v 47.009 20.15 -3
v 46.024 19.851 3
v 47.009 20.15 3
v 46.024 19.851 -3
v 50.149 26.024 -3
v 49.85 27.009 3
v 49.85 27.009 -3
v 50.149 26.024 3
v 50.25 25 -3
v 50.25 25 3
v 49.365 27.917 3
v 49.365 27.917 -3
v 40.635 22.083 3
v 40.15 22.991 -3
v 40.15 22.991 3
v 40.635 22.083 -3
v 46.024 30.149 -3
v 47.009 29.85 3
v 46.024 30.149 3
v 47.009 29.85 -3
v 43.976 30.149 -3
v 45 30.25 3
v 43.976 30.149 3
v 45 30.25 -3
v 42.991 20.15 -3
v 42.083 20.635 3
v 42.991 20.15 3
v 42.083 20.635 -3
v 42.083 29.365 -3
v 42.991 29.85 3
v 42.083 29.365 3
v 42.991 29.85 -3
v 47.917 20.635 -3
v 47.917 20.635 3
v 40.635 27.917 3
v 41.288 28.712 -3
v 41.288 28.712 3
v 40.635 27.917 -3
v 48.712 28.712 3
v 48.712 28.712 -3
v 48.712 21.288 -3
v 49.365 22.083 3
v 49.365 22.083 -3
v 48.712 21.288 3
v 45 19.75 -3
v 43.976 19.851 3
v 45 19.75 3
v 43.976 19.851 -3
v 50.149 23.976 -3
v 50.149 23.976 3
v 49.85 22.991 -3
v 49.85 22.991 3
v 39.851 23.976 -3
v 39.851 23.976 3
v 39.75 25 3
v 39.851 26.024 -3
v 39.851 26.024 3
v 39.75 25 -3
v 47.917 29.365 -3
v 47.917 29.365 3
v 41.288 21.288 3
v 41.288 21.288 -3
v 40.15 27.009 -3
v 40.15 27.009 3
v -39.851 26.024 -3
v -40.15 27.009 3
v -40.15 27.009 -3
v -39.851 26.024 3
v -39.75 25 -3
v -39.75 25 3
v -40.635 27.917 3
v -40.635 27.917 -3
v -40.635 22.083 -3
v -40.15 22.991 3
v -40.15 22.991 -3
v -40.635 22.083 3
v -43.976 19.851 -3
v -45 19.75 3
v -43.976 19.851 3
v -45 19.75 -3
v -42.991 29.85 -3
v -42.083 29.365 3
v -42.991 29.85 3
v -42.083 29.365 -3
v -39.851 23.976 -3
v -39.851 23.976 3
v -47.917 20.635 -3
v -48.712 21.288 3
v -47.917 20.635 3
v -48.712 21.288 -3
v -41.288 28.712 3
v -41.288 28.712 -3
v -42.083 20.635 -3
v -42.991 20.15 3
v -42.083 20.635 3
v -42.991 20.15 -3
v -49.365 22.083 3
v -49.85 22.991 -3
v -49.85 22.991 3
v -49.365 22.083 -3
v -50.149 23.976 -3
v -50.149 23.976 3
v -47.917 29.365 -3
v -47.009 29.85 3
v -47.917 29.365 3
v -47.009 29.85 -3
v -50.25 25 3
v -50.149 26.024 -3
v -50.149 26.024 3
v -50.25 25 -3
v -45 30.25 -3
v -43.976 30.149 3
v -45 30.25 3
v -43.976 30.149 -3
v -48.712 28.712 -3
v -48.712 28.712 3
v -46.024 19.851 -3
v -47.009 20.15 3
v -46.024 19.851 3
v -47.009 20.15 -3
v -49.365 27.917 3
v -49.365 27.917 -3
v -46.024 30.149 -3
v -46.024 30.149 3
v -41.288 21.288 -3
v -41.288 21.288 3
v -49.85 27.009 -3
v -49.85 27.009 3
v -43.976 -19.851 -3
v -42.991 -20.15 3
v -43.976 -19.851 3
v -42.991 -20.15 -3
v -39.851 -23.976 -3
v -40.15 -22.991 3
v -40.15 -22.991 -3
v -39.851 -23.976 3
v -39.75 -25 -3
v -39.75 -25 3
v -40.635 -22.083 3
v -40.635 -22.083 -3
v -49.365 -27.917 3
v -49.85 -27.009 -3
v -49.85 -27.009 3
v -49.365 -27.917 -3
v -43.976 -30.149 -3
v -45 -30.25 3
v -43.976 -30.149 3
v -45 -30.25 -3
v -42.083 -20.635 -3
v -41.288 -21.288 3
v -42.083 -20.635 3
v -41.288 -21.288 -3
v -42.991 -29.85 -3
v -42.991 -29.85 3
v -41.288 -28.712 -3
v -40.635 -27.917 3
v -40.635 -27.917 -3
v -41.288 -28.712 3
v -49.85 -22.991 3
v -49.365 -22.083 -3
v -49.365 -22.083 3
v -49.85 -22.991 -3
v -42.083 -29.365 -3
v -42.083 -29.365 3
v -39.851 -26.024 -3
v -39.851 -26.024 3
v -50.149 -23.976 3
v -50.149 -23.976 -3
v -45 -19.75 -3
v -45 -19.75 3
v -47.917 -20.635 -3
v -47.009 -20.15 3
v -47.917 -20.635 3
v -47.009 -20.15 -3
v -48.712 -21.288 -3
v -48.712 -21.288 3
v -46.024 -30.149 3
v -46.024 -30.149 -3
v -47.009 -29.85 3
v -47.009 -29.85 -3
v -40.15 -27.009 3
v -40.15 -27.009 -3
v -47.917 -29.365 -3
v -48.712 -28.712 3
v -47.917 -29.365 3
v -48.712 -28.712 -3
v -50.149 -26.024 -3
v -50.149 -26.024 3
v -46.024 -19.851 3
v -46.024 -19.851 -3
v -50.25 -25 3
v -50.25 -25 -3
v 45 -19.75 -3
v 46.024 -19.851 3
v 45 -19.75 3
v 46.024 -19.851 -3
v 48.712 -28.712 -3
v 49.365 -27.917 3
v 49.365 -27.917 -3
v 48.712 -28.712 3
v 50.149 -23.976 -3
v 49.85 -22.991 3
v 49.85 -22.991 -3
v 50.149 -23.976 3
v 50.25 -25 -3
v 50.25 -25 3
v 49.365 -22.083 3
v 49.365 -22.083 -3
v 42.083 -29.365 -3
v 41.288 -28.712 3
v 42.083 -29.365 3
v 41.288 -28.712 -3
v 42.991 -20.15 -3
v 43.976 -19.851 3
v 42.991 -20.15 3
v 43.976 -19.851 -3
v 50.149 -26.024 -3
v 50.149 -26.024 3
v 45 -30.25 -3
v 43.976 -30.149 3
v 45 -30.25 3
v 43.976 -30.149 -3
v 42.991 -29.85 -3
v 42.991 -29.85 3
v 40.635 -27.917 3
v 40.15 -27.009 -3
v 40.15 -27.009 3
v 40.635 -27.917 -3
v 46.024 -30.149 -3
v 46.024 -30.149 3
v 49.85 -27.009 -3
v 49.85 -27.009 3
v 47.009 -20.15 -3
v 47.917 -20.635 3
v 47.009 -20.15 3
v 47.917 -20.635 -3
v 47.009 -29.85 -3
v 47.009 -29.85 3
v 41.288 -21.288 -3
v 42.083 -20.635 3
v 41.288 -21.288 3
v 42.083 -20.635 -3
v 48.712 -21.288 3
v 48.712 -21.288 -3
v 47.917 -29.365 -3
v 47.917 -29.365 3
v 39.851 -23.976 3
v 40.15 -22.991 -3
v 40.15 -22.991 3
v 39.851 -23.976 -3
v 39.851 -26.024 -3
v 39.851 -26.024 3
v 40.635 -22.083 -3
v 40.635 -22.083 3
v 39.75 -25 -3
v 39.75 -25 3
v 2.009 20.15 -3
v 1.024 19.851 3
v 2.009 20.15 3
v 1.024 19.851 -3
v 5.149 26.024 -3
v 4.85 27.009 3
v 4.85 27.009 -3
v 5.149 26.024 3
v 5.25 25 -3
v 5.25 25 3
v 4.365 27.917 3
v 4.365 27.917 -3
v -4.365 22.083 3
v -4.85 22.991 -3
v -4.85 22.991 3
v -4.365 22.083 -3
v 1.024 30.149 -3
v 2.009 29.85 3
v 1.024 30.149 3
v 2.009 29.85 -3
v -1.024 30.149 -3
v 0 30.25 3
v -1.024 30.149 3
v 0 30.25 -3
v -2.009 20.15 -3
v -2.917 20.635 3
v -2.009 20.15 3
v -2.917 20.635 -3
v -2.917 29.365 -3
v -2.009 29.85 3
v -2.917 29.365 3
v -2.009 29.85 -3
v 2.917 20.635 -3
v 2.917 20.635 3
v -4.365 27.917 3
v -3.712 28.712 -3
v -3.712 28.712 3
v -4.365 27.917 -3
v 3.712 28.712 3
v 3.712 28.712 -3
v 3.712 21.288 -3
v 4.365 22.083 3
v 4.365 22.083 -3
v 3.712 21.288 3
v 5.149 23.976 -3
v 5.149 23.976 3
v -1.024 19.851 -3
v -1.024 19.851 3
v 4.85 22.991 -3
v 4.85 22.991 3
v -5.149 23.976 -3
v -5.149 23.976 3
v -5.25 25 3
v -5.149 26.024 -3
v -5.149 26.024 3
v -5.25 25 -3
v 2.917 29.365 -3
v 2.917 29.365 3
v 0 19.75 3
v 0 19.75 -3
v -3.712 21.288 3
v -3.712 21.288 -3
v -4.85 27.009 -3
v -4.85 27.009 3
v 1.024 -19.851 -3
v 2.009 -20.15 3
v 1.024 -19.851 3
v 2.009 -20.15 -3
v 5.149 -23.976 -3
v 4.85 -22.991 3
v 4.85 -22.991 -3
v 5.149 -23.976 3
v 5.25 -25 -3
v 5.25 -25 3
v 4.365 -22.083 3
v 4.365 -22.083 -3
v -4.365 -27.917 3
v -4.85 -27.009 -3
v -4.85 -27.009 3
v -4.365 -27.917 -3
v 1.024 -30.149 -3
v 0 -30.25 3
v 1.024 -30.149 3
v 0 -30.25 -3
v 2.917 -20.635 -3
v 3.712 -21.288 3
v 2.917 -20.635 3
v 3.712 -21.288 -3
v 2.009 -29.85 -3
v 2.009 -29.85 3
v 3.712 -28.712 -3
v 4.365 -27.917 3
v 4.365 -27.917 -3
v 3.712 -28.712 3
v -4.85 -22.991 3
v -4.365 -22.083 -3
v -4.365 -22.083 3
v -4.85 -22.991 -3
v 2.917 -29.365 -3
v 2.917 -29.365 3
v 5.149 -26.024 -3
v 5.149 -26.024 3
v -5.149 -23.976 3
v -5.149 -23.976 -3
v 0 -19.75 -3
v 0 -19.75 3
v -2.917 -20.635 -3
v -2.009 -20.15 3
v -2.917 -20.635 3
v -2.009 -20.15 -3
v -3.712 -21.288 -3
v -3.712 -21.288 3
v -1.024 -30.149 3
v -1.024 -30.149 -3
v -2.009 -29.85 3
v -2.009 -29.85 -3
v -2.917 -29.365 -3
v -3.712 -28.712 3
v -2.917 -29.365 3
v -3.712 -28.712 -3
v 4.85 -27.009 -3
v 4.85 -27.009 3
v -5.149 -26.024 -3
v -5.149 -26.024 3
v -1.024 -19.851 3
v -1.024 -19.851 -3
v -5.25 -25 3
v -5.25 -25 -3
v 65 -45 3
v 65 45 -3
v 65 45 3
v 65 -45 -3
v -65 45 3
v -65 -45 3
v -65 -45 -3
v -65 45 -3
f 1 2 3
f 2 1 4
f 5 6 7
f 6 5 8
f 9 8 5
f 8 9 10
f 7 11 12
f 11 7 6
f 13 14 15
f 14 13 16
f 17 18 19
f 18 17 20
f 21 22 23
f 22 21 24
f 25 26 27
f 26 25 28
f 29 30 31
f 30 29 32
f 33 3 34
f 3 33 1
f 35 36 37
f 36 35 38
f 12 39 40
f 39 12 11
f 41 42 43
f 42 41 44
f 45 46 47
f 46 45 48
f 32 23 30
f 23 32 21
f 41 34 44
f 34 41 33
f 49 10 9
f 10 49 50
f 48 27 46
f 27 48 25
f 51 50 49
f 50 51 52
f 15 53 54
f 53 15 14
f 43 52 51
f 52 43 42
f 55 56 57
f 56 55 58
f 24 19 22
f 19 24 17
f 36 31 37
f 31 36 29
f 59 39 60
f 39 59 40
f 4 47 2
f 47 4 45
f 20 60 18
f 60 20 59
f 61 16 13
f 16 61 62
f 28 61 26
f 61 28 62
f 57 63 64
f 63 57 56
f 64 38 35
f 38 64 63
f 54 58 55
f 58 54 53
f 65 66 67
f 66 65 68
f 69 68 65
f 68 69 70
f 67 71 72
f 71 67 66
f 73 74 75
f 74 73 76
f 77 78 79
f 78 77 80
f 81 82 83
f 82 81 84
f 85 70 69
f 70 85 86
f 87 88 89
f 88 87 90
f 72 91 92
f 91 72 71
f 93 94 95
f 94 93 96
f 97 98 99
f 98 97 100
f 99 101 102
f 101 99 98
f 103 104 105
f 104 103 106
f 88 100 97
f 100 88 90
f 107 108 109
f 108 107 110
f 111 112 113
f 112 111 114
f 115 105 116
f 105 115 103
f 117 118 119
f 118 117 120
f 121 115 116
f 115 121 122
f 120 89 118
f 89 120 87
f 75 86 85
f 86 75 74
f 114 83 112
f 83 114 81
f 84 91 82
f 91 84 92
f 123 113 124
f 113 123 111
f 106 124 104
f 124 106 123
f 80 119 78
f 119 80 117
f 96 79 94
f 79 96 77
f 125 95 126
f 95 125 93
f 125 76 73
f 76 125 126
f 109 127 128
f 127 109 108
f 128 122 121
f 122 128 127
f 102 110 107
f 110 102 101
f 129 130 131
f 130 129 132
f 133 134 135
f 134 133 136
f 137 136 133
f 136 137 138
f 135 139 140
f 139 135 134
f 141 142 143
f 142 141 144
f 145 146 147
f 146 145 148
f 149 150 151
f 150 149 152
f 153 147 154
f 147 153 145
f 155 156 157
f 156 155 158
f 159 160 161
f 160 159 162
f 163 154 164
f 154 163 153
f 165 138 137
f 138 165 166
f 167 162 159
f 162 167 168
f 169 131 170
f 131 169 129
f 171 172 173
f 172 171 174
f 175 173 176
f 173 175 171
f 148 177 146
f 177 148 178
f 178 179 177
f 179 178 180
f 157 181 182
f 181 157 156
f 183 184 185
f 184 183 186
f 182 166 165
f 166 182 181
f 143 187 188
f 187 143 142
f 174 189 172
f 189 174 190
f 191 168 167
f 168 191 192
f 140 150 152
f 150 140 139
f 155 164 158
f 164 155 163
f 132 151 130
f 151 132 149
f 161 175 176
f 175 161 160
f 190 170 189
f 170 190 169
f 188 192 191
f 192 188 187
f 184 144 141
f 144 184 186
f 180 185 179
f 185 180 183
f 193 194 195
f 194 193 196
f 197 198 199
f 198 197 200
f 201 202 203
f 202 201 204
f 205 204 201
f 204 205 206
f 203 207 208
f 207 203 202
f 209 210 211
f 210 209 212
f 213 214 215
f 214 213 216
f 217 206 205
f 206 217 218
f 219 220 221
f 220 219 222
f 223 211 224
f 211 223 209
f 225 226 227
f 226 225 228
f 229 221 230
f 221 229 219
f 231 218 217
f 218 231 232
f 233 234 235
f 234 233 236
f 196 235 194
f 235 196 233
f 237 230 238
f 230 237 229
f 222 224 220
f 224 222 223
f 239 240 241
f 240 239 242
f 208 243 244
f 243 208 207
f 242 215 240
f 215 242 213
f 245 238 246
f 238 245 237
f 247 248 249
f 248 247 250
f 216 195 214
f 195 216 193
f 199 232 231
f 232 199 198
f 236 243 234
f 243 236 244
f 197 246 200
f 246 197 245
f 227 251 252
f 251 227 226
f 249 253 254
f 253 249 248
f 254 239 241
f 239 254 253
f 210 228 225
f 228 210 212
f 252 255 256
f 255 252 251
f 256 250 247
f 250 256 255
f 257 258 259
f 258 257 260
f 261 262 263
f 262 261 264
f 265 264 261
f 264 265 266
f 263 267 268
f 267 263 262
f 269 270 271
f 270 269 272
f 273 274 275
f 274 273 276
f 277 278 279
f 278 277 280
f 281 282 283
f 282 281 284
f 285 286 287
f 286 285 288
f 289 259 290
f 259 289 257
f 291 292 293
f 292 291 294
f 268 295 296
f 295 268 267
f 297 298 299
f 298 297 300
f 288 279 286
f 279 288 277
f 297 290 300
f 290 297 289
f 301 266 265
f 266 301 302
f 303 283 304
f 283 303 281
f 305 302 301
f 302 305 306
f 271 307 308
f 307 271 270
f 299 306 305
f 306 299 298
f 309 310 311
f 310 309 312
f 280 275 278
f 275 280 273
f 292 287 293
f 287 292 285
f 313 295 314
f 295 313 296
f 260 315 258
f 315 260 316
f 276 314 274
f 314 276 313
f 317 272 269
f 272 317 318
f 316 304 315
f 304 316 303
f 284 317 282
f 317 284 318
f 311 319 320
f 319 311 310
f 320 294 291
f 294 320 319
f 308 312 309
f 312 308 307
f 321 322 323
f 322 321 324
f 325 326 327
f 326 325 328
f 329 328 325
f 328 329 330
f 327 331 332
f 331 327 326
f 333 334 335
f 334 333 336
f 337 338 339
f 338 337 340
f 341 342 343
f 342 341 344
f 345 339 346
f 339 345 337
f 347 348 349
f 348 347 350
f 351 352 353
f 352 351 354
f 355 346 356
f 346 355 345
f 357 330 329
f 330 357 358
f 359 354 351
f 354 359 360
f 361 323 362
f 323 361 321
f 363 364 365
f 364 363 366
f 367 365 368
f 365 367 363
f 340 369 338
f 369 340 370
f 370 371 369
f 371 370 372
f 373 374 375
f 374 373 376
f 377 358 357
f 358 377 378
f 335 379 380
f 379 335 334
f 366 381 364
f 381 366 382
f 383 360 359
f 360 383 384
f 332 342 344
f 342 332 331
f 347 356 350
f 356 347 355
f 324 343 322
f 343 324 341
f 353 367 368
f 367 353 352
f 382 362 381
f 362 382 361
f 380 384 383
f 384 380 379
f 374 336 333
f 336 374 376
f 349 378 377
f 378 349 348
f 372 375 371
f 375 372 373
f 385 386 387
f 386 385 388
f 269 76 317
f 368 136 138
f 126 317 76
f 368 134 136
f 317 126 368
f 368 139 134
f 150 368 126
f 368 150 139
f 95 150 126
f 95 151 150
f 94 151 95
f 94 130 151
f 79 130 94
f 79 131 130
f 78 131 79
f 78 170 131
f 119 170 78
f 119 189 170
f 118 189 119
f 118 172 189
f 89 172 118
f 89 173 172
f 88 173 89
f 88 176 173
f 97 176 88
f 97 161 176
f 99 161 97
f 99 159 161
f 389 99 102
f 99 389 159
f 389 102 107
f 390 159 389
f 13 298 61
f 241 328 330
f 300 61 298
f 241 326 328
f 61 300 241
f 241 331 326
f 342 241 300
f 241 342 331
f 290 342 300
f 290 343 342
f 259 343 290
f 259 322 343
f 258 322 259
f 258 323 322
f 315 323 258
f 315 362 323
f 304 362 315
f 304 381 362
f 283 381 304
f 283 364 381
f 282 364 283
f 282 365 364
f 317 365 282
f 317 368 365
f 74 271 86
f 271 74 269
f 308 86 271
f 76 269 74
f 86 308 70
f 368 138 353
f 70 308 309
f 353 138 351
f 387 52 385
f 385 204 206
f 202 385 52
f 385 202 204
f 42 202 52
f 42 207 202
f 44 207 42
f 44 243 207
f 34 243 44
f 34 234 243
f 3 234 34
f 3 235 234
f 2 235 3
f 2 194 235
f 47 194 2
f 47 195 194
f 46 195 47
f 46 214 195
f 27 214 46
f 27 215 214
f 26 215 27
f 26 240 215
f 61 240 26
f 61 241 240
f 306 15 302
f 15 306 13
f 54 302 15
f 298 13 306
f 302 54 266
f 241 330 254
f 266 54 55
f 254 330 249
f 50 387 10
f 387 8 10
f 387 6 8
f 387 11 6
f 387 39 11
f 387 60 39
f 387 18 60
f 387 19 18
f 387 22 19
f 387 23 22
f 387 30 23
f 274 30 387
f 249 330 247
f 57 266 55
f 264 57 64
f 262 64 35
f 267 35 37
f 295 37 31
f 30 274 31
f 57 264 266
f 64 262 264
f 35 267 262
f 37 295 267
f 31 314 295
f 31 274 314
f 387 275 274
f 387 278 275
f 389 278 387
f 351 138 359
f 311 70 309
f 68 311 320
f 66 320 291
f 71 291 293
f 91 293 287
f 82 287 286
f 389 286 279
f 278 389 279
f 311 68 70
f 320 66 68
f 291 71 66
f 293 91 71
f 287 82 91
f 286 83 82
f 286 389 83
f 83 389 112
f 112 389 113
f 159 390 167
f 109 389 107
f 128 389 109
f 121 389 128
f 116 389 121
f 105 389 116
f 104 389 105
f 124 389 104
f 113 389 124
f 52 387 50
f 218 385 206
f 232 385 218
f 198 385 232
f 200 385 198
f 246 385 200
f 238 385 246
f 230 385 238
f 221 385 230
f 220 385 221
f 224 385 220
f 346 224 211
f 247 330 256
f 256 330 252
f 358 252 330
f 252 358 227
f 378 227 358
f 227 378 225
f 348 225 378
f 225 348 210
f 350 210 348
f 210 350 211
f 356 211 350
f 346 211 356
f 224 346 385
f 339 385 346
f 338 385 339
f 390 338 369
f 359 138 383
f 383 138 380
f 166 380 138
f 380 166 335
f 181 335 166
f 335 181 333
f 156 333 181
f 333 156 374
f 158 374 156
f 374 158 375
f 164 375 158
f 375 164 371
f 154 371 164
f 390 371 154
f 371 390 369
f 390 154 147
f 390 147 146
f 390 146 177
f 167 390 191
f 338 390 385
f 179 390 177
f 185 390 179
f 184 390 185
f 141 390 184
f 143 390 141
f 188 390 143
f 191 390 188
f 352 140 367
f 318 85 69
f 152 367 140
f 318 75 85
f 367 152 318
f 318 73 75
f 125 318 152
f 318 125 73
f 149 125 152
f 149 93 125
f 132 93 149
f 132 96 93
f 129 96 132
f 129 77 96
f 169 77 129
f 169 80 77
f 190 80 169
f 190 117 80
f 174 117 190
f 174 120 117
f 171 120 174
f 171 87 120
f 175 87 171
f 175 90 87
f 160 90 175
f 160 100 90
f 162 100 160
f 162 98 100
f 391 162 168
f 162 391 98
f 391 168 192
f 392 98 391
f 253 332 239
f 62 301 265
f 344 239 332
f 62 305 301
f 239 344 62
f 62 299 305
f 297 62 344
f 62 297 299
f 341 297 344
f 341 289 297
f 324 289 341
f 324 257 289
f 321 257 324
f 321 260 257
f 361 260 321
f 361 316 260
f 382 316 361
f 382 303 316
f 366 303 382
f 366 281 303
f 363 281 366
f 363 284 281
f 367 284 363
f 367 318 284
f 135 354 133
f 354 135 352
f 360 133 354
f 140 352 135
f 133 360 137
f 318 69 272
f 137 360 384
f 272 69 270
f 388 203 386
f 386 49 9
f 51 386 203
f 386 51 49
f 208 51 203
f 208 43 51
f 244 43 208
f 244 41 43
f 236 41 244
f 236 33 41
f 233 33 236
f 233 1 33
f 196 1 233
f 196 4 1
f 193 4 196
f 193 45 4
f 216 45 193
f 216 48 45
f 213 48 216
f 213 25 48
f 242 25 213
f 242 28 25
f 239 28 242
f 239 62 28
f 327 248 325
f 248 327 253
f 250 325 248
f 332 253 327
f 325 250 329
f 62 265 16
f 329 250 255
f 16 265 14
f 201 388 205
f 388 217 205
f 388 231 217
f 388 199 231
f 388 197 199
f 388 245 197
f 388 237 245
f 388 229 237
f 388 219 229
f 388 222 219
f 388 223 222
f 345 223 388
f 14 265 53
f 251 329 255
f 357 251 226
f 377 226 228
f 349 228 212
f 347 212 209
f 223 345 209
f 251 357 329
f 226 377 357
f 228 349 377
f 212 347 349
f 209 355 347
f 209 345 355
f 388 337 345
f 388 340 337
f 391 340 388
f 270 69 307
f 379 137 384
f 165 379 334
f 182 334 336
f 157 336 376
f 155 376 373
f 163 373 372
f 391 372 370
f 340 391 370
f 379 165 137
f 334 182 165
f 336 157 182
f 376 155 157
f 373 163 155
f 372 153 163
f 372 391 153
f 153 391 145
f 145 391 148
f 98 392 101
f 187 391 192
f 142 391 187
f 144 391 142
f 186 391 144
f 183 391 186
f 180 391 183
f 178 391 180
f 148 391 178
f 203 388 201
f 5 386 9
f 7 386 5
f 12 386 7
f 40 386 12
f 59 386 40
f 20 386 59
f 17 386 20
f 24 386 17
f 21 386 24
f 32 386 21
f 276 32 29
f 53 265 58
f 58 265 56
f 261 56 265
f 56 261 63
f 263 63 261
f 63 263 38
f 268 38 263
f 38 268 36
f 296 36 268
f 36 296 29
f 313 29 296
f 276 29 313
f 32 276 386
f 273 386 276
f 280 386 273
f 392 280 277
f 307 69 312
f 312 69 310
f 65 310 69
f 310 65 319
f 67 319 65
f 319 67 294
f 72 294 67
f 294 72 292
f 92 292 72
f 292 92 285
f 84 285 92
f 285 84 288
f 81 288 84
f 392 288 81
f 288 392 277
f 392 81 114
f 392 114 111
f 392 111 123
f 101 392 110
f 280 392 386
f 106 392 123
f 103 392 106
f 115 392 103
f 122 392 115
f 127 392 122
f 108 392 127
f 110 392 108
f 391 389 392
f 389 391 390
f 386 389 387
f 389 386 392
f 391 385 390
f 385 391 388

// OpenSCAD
$fn = 32;

// ----------------------------------------------------------------------
// Corner plate 130 x 90 x 6
// 6 holes, centres taken from the edge offset
// ----------------------------------------------------------------------

// --- parameters (mm) ---
plate = [130, 90, 6];  // overall size (x, y, z)
holes = 6;             // number of holes the drawing asks for
hole_d = 10.5;         // hole diameter
edge = 20;             // hole centre offset from the plate edge

// --- derived feature positions (mm) ---
corner_x = plate[0] / 2 - edge;  // = 45   corner hole X
corner_y = plate[1] / 2 - edge;  // = 25   corner hole Y
feature_centers = [
  [corner_x, corner_y],
  [-corner_x, corner_y],
  [-corner_x, -corner_y],
  [corner_x, -corner_y],
  [0, corner_y],
  [0, -corner_y]
];   // hole centres the loop below drills

// plate outline, every hole drilled through with the same cutters
difference() {
  cube(plate, center = true);
  for (centre = feature_centers)
    translate([centre[0], centre[1], 0])
      cylinder(d = hole_d, h = plate[2] + 2, center = true);
}
